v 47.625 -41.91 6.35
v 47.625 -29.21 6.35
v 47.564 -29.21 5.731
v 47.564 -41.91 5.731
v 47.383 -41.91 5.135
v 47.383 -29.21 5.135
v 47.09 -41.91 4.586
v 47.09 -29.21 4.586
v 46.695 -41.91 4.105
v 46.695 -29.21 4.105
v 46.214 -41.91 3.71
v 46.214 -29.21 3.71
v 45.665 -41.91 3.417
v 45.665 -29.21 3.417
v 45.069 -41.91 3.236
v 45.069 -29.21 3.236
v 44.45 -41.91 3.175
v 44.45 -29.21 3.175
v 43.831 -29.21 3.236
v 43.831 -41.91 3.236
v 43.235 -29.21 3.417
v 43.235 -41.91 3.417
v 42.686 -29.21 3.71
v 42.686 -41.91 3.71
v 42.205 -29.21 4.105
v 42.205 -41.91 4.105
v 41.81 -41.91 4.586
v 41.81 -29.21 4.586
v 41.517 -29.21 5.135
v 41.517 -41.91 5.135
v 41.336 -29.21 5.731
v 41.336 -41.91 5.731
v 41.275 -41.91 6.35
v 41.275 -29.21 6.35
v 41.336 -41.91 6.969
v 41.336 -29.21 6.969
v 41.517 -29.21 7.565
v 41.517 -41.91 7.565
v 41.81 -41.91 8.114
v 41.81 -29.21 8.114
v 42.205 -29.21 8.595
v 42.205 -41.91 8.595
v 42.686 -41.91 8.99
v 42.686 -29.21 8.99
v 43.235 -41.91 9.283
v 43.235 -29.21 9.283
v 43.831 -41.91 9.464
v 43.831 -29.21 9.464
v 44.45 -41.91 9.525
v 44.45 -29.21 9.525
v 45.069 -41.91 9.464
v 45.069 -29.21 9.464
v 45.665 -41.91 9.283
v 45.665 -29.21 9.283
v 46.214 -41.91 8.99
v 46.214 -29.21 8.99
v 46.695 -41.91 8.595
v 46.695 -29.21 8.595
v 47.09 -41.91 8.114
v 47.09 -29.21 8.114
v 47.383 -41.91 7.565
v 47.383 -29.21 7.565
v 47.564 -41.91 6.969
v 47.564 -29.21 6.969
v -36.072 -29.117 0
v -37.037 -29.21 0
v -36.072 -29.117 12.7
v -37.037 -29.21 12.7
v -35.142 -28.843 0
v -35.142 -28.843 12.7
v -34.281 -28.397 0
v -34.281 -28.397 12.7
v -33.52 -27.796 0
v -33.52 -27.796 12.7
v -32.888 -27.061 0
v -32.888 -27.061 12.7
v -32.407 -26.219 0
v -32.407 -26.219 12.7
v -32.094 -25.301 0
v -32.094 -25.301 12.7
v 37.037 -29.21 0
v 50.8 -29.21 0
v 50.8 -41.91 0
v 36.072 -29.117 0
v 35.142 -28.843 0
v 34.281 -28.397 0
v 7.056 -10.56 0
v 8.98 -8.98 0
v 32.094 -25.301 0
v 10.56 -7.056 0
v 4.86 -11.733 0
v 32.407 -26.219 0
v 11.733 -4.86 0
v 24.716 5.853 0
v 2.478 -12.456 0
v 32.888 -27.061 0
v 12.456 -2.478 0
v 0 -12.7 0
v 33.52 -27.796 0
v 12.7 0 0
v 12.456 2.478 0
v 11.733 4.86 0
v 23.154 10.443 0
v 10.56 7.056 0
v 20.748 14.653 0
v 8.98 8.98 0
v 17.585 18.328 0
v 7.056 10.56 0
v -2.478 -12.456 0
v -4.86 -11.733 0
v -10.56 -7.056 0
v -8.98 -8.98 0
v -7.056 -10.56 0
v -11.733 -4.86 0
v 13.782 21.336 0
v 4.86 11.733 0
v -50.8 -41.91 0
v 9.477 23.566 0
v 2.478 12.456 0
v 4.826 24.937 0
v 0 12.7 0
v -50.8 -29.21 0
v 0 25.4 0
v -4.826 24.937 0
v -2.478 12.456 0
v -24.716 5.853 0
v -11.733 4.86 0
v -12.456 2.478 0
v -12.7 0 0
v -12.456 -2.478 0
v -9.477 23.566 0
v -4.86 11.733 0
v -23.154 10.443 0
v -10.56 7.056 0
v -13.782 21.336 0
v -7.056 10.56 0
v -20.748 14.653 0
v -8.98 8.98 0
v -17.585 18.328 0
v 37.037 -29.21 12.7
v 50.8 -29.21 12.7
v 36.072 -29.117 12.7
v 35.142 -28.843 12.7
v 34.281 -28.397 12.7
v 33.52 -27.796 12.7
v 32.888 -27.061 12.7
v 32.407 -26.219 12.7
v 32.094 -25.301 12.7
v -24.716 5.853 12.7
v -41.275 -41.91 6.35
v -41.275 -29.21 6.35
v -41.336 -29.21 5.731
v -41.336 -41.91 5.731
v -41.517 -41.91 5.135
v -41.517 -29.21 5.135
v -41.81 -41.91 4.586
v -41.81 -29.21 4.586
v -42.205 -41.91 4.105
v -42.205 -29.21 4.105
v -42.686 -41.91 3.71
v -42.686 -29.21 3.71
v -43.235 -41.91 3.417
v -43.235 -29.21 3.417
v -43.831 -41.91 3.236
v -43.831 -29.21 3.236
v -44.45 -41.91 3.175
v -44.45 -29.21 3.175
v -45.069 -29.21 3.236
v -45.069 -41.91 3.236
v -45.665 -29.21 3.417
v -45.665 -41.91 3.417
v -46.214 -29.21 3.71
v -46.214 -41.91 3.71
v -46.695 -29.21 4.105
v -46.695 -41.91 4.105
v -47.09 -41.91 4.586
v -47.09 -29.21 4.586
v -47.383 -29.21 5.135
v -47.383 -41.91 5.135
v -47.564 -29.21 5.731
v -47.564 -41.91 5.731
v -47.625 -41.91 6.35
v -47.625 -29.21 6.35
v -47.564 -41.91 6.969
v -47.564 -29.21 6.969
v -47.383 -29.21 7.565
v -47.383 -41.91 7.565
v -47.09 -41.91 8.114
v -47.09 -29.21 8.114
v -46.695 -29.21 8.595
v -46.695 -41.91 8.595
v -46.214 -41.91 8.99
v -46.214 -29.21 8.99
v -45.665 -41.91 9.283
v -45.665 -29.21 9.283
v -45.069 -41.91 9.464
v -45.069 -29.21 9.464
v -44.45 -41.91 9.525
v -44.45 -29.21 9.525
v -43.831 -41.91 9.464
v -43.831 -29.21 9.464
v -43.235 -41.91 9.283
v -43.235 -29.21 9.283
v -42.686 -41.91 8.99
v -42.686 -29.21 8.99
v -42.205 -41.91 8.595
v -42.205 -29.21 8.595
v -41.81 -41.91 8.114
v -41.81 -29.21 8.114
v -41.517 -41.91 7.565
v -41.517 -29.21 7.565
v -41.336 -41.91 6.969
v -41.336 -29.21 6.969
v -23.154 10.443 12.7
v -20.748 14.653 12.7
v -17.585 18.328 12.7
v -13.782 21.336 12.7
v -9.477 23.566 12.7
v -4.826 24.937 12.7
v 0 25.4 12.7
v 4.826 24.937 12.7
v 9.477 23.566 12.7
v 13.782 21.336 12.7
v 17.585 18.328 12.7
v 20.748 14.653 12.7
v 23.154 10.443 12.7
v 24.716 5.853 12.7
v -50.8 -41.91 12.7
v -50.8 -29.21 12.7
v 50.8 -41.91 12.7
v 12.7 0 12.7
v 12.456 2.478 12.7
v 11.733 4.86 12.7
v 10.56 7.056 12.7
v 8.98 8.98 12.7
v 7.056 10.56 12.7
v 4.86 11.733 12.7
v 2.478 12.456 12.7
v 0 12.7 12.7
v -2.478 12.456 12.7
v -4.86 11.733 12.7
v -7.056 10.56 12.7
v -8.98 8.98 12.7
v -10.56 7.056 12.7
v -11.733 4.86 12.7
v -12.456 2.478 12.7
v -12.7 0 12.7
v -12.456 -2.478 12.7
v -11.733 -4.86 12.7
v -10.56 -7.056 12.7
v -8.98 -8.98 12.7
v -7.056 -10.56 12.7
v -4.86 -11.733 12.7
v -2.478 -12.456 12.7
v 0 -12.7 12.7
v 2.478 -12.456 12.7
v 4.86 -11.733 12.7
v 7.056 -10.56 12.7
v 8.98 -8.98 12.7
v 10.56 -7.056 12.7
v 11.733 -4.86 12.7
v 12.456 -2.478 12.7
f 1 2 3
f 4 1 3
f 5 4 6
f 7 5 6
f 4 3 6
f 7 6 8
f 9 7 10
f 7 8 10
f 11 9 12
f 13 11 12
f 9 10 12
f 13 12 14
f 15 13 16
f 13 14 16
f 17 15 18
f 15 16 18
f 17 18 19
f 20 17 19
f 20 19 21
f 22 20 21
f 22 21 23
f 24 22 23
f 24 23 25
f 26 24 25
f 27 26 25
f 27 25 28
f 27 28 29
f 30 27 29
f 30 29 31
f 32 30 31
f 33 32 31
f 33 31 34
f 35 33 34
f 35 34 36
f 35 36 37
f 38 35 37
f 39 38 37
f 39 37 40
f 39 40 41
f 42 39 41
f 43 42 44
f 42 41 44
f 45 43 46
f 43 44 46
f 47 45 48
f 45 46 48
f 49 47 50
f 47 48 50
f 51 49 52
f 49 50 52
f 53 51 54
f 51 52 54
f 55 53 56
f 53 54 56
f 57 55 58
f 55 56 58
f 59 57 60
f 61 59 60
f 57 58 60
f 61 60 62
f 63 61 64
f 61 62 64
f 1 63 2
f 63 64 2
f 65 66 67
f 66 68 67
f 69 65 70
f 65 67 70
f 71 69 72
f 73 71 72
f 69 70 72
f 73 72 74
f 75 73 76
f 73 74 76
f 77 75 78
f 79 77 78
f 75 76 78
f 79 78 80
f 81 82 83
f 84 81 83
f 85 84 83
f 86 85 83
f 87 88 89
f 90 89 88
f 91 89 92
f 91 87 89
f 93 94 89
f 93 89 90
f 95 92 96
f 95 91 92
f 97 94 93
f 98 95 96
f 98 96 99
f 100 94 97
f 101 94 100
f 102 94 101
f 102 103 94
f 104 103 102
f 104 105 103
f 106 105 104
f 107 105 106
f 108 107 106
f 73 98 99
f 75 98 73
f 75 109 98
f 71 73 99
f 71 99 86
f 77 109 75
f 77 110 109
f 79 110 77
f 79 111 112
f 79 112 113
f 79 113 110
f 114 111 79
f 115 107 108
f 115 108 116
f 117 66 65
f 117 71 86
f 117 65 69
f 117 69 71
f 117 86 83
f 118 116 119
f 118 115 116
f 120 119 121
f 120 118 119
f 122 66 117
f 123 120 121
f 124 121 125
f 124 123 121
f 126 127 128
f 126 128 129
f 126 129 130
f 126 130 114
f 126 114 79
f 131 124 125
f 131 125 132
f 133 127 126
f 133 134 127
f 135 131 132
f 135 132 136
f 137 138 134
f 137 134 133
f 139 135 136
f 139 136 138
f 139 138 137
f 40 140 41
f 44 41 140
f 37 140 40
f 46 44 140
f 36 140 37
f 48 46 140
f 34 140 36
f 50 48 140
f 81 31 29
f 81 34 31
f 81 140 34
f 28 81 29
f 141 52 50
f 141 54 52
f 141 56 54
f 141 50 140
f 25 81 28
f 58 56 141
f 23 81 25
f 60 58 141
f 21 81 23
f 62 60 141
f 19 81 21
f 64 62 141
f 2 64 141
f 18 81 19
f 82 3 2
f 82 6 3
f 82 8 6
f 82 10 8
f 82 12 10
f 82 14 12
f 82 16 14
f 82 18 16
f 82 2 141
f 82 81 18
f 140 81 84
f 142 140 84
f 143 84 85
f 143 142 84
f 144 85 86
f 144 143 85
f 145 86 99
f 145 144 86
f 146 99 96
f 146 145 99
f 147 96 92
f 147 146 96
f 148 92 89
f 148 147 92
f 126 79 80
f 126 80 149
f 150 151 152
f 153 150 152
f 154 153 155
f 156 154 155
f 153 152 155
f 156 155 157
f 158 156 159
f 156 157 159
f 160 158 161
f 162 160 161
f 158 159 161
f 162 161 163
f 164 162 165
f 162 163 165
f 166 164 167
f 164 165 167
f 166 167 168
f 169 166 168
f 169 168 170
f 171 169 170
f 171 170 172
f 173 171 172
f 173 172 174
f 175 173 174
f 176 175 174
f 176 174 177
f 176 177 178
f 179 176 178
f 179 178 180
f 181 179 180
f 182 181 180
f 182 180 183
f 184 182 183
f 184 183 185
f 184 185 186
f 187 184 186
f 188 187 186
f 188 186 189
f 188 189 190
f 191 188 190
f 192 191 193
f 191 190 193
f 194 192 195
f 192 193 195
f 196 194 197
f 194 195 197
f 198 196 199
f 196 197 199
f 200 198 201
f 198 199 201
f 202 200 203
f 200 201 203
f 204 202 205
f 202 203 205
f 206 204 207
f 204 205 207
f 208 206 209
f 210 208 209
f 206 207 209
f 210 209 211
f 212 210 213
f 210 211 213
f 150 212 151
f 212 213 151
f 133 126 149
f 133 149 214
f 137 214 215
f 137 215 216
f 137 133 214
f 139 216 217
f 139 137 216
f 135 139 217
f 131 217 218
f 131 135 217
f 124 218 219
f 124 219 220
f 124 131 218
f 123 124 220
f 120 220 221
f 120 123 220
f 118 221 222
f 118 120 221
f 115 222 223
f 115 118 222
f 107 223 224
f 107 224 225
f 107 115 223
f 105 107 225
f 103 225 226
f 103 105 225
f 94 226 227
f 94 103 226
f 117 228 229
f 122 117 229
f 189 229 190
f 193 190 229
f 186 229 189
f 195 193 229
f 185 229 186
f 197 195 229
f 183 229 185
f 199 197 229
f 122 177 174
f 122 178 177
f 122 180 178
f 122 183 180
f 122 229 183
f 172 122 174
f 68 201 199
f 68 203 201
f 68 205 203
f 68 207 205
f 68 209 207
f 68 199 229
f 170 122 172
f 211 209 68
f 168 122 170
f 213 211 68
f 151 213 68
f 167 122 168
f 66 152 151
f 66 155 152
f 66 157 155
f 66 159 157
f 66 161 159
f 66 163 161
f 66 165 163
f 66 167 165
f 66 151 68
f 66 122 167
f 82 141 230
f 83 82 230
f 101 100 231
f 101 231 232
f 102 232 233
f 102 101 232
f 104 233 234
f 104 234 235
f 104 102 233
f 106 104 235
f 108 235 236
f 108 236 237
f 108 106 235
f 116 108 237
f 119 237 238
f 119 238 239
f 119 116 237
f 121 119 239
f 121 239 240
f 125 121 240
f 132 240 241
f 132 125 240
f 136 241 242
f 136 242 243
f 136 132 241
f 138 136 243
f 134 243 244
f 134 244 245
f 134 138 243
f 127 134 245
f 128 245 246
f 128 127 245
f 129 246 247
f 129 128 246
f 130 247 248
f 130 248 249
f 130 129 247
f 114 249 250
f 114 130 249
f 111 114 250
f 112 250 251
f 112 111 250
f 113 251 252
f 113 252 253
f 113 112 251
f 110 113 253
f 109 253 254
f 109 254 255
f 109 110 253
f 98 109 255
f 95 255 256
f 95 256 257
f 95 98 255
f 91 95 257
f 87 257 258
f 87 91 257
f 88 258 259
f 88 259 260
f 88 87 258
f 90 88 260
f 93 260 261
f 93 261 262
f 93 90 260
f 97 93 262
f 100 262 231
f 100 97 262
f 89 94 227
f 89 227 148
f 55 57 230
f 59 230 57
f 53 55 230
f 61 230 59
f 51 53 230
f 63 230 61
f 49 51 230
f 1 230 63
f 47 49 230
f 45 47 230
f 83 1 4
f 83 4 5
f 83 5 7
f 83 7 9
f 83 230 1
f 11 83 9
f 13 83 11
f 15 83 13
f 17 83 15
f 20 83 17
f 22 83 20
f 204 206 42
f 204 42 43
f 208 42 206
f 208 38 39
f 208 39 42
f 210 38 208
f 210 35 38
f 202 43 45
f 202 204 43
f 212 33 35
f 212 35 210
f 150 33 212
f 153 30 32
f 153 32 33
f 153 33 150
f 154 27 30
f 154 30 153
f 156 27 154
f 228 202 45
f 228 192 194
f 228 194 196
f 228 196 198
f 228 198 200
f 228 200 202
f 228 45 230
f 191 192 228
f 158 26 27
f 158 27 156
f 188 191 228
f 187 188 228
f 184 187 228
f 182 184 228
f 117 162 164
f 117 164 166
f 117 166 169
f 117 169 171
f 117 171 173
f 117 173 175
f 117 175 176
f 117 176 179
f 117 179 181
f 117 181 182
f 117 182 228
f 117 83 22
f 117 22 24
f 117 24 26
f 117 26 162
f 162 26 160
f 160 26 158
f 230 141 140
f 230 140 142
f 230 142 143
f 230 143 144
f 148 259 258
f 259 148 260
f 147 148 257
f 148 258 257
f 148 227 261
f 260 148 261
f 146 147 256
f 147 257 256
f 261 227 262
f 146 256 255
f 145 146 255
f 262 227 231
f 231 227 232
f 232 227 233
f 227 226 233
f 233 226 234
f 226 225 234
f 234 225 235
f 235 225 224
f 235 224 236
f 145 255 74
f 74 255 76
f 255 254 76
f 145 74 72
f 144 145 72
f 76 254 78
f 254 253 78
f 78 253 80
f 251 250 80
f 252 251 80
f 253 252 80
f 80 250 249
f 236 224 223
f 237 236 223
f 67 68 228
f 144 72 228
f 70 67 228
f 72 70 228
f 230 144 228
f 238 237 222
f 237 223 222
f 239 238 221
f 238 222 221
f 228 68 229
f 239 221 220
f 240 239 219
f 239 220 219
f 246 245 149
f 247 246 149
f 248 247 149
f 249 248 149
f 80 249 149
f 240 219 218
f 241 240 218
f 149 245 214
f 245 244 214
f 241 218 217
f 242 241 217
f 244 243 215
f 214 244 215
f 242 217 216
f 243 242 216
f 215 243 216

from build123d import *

# Parameters (mm, degrees)
SKETCH1_R           = 12.7
BOSS_EXTRUDE1_DEPTH = 12.7
SKETCH2_R           = 3.175
CUT_EXTRUDE1_DEPTH  = 13.7
FILLET1_R           = 5.08


with BuildPart() as part:
    # Sketch1 → Boss-Extrude1 (new body)
    with BuildSketch(Plane.XY):
        with BuildLine():
            Line((50.8, -41.91), (-50.8, -41.91))
            Line((-50.8, -41.91), (-50.8, -29.21))
            Line((-50.8, -29.21), (-33.02, -29.21))
            Line((-33.02, -29.21), (-24.716371207, 5.853289191))
            ThreePointArc((-24.716371207, 5.853289191), (0, 25.4), (24.716371207, 5.853289191))
            Line((24.716371207, 5.853289191), (33.02, -29.21))
            Line((33.02, -29.21), (50.8, -29.21))
            Line((50.8, -29.21), (50.8, -41.91))
        make_face()
        Circle(SKETCH1_R, mode=Mode.SUBTRACT)
    extrude(amount=BOSS_EXTRUDE1_DEPTH)

    # Sketch2 → Cut-Extrude1 (cut, through all)
    with BuildSketch(Plane(origin=(0, -29.21, 0), x_dir=(1, 0, 0), z_dir=(0, 1, 0))):
        with Locations((-44.45, -6.35)):
            Circle(SKETCH2_R)
        with Locations((44.45, -6.35)):
            Circle(SKETCH2_R)
    extrude(amount=-CUT_EXTRUDE1_DEPTH, mode=Mode.SUBTRACT)

    # Fillet1
    fillet1_edges = [part.edges().sort_by_distance(p)[0] for p in [
        (-33.02, -29.21, 6.35),
        (33.02, -29.21, 6.35),
    ]]
    fillet(fillet1_edges, radius=FILLET1_R)


solid = part.part
